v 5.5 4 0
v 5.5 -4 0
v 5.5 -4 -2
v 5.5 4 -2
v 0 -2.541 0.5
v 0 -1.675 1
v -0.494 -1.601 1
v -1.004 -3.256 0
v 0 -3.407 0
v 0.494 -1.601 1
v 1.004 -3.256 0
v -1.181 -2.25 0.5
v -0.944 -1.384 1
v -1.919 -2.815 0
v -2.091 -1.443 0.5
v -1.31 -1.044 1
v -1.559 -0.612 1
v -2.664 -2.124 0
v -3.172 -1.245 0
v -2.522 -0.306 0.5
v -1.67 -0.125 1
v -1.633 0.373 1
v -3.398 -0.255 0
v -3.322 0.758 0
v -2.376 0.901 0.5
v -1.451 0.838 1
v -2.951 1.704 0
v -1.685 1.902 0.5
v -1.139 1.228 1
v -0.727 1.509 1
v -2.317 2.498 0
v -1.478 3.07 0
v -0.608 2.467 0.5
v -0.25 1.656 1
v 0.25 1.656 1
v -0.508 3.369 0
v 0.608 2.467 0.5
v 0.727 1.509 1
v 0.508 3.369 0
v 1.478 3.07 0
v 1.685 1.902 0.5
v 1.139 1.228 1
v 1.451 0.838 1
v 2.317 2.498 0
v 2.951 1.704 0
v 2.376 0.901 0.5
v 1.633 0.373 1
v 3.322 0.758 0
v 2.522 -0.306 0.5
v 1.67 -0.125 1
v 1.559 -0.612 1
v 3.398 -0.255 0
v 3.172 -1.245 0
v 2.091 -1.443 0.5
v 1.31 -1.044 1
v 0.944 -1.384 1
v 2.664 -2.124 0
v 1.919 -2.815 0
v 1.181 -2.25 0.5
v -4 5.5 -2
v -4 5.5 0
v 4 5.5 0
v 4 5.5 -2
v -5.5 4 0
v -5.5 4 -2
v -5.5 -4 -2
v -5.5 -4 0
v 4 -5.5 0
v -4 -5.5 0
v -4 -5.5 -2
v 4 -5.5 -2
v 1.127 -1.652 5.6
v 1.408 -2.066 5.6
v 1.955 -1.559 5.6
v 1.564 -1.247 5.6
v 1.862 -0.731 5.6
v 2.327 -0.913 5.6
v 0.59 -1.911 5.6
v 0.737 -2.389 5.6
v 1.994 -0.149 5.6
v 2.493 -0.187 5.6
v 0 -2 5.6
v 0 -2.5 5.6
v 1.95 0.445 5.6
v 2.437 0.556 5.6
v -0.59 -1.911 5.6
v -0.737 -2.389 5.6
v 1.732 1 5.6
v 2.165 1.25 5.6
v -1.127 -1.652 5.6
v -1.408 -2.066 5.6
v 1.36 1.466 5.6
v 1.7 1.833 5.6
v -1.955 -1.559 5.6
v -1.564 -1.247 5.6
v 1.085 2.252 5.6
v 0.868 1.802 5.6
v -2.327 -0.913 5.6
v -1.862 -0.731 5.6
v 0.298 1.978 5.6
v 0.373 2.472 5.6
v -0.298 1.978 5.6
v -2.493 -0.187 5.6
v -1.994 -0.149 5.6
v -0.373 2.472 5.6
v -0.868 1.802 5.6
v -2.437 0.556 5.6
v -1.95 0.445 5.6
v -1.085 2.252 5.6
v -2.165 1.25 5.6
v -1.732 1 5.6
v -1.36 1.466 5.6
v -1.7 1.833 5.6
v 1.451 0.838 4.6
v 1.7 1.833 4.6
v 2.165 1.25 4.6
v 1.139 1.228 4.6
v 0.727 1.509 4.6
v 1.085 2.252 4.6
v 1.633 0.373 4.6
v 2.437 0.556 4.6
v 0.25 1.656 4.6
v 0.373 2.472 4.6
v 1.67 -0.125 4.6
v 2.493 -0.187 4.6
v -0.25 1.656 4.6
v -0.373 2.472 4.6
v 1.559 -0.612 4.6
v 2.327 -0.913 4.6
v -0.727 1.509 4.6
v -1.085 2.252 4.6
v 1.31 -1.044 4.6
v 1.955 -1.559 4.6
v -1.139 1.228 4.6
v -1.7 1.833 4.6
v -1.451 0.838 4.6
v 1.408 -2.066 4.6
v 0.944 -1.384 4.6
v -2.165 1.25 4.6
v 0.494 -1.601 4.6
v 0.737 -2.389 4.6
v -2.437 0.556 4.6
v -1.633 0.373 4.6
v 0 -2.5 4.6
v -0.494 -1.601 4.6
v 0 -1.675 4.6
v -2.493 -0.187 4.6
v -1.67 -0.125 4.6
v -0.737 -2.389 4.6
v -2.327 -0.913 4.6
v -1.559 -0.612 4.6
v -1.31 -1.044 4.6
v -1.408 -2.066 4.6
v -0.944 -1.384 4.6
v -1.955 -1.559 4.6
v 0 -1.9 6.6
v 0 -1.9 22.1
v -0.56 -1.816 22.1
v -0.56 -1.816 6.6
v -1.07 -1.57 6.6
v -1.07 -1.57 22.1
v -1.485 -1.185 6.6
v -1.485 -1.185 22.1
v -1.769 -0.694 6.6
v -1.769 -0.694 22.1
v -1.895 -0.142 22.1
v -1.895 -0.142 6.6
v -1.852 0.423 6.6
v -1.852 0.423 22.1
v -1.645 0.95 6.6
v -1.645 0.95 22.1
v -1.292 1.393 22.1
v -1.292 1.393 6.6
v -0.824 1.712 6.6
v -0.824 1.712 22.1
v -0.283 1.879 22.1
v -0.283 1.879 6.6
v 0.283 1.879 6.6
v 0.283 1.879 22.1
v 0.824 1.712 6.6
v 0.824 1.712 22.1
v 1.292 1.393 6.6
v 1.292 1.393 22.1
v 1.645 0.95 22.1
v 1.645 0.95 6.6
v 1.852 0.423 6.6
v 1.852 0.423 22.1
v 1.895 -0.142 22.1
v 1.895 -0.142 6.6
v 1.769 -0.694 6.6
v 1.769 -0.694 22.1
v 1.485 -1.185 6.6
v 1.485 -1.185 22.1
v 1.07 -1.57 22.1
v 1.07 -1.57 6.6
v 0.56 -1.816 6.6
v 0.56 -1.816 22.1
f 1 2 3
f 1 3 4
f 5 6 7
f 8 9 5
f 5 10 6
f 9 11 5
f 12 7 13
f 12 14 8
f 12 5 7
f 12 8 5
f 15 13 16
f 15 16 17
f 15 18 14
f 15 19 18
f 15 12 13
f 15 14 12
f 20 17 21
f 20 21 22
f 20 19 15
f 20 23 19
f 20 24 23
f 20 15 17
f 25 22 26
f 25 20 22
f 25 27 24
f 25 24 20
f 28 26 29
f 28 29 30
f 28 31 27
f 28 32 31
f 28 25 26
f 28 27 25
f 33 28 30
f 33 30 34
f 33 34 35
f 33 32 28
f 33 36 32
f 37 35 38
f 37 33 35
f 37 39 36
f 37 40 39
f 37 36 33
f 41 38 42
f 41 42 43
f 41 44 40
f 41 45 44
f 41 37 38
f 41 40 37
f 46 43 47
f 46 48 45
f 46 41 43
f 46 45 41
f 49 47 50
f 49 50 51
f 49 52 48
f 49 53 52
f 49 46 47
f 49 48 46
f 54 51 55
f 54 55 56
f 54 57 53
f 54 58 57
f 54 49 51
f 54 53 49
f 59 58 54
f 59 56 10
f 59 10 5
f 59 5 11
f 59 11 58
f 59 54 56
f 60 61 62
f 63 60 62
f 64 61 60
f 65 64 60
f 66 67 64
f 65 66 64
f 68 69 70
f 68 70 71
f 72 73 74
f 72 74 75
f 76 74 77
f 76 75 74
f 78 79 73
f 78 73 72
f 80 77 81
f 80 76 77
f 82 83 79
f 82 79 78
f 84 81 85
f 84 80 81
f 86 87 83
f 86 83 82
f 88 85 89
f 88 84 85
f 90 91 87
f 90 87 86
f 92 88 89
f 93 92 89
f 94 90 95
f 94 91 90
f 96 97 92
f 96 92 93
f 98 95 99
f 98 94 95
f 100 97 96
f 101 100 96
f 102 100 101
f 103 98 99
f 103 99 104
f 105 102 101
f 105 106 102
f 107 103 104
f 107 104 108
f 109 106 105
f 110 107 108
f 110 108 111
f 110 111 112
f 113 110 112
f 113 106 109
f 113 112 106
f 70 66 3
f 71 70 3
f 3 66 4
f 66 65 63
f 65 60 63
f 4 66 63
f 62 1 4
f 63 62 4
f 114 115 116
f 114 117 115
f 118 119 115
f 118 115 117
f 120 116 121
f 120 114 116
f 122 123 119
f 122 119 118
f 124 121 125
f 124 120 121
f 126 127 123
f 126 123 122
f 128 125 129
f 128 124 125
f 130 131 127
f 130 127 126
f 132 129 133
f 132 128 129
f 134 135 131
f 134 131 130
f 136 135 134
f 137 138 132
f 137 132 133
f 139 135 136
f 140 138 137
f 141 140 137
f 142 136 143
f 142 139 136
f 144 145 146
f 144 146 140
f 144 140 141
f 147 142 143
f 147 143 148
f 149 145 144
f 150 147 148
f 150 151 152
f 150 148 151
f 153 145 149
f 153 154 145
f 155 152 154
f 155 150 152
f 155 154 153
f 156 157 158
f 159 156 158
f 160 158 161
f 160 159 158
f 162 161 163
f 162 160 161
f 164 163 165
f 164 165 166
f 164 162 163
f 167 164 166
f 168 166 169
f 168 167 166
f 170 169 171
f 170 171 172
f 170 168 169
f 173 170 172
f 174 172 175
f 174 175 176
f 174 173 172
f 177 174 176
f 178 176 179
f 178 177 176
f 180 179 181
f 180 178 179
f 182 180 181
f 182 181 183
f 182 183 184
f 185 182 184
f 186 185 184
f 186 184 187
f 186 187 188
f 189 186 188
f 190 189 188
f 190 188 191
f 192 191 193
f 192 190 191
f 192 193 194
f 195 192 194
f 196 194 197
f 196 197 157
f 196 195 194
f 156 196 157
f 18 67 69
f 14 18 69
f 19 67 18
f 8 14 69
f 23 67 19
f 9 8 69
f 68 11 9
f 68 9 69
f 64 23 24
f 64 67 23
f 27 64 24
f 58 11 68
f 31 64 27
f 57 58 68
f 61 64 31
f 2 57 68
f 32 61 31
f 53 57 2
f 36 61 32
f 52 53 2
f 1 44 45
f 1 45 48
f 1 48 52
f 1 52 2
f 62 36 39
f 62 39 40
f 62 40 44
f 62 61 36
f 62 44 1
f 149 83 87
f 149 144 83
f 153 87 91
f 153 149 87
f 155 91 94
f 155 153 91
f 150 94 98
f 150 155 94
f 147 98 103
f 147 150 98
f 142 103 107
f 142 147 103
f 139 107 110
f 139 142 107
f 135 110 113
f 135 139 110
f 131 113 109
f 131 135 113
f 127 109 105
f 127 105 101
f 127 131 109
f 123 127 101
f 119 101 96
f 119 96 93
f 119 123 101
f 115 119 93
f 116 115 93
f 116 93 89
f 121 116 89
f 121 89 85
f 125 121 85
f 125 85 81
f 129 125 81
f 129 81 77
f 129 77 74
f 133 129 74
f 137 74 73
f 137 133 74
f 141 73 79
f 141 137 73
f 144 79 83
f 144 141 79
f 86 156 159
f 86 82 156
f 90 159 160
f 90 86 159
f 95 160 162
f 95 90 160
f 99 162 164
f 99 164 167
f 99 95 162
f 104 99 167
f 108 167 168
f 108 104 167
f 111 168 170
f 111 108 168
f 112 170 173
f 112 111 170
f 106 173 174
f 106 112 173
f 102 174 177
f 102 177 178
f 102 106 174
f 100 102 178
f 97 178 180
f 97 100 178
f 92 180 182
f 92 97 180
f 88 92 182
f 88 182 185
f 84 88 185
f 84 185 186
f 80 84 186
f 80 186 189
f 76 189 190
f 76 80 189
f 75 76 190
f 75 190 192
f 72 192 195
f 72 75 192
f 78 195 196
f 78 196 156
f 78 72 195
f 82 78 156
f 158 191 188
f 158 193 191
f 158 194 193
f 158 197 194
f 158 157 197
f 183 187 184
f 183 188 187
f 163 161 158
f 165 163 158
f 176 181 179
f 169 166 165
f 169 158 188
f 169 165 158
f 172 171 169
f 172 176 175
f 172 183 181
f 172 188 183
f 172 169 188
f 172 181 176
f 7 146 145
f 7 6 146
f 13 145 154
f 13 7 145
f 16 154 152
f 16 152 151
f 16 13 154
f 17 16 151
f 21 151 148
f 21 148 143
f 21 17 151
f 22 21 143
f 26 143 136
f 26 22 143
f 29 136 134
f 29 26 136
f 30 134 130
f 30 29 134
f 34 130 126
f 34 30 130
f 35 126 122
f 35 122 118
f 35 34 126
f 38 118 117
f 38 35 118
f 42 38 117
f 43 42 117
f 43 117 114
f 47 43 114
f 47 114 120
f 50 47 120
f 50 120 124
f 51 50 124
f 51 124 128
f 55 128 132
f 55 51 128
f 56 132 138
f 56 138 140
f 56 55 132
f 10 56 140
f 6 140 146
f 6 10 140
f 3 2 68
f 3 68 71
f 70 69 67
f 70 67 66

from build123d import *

# Parameters (mm, degrees)
F2_W     = 11
F2_H     = 11
F3_DEPTH = 2
F4_SIZE  = 1.5


with BuildPart() as f1:
    # F0 (on Right) → F1 (revolve)
    with BuildSketch(Plane.YZ):
        Polygon((-1.675, 1), (-3.407051, 0), (0, 0), (0, 22.1), (-1.9, 22.1), (-1.9, 6.6), (-2, 5.6), (-2.5, 5.6), (-2.5, 4.6), (-1.675, 4.6), align=None)
    revolve(axis=Axis((0, 0, 11.05), (0, 0, -1)))

    # F2 (on Top) → F3 (join)
    with BuildSketch(Plane.XY):
        Rectangle(F2_W, F2_H)
    extrude(amount=-F3_DEPTH)

    # F4
    f4_edges = [f1.edges().sort_by_distance(p)[0] for p in [
        (-5.5, 5.5, -1),
        (5.5, 5.5, -1),
        (5.5, -5.5, -1),
        (-5.5, -5.5, -1),
    ]]
    chamfer(f4_edges, length=F4_SIZE)


solid = f1.part
